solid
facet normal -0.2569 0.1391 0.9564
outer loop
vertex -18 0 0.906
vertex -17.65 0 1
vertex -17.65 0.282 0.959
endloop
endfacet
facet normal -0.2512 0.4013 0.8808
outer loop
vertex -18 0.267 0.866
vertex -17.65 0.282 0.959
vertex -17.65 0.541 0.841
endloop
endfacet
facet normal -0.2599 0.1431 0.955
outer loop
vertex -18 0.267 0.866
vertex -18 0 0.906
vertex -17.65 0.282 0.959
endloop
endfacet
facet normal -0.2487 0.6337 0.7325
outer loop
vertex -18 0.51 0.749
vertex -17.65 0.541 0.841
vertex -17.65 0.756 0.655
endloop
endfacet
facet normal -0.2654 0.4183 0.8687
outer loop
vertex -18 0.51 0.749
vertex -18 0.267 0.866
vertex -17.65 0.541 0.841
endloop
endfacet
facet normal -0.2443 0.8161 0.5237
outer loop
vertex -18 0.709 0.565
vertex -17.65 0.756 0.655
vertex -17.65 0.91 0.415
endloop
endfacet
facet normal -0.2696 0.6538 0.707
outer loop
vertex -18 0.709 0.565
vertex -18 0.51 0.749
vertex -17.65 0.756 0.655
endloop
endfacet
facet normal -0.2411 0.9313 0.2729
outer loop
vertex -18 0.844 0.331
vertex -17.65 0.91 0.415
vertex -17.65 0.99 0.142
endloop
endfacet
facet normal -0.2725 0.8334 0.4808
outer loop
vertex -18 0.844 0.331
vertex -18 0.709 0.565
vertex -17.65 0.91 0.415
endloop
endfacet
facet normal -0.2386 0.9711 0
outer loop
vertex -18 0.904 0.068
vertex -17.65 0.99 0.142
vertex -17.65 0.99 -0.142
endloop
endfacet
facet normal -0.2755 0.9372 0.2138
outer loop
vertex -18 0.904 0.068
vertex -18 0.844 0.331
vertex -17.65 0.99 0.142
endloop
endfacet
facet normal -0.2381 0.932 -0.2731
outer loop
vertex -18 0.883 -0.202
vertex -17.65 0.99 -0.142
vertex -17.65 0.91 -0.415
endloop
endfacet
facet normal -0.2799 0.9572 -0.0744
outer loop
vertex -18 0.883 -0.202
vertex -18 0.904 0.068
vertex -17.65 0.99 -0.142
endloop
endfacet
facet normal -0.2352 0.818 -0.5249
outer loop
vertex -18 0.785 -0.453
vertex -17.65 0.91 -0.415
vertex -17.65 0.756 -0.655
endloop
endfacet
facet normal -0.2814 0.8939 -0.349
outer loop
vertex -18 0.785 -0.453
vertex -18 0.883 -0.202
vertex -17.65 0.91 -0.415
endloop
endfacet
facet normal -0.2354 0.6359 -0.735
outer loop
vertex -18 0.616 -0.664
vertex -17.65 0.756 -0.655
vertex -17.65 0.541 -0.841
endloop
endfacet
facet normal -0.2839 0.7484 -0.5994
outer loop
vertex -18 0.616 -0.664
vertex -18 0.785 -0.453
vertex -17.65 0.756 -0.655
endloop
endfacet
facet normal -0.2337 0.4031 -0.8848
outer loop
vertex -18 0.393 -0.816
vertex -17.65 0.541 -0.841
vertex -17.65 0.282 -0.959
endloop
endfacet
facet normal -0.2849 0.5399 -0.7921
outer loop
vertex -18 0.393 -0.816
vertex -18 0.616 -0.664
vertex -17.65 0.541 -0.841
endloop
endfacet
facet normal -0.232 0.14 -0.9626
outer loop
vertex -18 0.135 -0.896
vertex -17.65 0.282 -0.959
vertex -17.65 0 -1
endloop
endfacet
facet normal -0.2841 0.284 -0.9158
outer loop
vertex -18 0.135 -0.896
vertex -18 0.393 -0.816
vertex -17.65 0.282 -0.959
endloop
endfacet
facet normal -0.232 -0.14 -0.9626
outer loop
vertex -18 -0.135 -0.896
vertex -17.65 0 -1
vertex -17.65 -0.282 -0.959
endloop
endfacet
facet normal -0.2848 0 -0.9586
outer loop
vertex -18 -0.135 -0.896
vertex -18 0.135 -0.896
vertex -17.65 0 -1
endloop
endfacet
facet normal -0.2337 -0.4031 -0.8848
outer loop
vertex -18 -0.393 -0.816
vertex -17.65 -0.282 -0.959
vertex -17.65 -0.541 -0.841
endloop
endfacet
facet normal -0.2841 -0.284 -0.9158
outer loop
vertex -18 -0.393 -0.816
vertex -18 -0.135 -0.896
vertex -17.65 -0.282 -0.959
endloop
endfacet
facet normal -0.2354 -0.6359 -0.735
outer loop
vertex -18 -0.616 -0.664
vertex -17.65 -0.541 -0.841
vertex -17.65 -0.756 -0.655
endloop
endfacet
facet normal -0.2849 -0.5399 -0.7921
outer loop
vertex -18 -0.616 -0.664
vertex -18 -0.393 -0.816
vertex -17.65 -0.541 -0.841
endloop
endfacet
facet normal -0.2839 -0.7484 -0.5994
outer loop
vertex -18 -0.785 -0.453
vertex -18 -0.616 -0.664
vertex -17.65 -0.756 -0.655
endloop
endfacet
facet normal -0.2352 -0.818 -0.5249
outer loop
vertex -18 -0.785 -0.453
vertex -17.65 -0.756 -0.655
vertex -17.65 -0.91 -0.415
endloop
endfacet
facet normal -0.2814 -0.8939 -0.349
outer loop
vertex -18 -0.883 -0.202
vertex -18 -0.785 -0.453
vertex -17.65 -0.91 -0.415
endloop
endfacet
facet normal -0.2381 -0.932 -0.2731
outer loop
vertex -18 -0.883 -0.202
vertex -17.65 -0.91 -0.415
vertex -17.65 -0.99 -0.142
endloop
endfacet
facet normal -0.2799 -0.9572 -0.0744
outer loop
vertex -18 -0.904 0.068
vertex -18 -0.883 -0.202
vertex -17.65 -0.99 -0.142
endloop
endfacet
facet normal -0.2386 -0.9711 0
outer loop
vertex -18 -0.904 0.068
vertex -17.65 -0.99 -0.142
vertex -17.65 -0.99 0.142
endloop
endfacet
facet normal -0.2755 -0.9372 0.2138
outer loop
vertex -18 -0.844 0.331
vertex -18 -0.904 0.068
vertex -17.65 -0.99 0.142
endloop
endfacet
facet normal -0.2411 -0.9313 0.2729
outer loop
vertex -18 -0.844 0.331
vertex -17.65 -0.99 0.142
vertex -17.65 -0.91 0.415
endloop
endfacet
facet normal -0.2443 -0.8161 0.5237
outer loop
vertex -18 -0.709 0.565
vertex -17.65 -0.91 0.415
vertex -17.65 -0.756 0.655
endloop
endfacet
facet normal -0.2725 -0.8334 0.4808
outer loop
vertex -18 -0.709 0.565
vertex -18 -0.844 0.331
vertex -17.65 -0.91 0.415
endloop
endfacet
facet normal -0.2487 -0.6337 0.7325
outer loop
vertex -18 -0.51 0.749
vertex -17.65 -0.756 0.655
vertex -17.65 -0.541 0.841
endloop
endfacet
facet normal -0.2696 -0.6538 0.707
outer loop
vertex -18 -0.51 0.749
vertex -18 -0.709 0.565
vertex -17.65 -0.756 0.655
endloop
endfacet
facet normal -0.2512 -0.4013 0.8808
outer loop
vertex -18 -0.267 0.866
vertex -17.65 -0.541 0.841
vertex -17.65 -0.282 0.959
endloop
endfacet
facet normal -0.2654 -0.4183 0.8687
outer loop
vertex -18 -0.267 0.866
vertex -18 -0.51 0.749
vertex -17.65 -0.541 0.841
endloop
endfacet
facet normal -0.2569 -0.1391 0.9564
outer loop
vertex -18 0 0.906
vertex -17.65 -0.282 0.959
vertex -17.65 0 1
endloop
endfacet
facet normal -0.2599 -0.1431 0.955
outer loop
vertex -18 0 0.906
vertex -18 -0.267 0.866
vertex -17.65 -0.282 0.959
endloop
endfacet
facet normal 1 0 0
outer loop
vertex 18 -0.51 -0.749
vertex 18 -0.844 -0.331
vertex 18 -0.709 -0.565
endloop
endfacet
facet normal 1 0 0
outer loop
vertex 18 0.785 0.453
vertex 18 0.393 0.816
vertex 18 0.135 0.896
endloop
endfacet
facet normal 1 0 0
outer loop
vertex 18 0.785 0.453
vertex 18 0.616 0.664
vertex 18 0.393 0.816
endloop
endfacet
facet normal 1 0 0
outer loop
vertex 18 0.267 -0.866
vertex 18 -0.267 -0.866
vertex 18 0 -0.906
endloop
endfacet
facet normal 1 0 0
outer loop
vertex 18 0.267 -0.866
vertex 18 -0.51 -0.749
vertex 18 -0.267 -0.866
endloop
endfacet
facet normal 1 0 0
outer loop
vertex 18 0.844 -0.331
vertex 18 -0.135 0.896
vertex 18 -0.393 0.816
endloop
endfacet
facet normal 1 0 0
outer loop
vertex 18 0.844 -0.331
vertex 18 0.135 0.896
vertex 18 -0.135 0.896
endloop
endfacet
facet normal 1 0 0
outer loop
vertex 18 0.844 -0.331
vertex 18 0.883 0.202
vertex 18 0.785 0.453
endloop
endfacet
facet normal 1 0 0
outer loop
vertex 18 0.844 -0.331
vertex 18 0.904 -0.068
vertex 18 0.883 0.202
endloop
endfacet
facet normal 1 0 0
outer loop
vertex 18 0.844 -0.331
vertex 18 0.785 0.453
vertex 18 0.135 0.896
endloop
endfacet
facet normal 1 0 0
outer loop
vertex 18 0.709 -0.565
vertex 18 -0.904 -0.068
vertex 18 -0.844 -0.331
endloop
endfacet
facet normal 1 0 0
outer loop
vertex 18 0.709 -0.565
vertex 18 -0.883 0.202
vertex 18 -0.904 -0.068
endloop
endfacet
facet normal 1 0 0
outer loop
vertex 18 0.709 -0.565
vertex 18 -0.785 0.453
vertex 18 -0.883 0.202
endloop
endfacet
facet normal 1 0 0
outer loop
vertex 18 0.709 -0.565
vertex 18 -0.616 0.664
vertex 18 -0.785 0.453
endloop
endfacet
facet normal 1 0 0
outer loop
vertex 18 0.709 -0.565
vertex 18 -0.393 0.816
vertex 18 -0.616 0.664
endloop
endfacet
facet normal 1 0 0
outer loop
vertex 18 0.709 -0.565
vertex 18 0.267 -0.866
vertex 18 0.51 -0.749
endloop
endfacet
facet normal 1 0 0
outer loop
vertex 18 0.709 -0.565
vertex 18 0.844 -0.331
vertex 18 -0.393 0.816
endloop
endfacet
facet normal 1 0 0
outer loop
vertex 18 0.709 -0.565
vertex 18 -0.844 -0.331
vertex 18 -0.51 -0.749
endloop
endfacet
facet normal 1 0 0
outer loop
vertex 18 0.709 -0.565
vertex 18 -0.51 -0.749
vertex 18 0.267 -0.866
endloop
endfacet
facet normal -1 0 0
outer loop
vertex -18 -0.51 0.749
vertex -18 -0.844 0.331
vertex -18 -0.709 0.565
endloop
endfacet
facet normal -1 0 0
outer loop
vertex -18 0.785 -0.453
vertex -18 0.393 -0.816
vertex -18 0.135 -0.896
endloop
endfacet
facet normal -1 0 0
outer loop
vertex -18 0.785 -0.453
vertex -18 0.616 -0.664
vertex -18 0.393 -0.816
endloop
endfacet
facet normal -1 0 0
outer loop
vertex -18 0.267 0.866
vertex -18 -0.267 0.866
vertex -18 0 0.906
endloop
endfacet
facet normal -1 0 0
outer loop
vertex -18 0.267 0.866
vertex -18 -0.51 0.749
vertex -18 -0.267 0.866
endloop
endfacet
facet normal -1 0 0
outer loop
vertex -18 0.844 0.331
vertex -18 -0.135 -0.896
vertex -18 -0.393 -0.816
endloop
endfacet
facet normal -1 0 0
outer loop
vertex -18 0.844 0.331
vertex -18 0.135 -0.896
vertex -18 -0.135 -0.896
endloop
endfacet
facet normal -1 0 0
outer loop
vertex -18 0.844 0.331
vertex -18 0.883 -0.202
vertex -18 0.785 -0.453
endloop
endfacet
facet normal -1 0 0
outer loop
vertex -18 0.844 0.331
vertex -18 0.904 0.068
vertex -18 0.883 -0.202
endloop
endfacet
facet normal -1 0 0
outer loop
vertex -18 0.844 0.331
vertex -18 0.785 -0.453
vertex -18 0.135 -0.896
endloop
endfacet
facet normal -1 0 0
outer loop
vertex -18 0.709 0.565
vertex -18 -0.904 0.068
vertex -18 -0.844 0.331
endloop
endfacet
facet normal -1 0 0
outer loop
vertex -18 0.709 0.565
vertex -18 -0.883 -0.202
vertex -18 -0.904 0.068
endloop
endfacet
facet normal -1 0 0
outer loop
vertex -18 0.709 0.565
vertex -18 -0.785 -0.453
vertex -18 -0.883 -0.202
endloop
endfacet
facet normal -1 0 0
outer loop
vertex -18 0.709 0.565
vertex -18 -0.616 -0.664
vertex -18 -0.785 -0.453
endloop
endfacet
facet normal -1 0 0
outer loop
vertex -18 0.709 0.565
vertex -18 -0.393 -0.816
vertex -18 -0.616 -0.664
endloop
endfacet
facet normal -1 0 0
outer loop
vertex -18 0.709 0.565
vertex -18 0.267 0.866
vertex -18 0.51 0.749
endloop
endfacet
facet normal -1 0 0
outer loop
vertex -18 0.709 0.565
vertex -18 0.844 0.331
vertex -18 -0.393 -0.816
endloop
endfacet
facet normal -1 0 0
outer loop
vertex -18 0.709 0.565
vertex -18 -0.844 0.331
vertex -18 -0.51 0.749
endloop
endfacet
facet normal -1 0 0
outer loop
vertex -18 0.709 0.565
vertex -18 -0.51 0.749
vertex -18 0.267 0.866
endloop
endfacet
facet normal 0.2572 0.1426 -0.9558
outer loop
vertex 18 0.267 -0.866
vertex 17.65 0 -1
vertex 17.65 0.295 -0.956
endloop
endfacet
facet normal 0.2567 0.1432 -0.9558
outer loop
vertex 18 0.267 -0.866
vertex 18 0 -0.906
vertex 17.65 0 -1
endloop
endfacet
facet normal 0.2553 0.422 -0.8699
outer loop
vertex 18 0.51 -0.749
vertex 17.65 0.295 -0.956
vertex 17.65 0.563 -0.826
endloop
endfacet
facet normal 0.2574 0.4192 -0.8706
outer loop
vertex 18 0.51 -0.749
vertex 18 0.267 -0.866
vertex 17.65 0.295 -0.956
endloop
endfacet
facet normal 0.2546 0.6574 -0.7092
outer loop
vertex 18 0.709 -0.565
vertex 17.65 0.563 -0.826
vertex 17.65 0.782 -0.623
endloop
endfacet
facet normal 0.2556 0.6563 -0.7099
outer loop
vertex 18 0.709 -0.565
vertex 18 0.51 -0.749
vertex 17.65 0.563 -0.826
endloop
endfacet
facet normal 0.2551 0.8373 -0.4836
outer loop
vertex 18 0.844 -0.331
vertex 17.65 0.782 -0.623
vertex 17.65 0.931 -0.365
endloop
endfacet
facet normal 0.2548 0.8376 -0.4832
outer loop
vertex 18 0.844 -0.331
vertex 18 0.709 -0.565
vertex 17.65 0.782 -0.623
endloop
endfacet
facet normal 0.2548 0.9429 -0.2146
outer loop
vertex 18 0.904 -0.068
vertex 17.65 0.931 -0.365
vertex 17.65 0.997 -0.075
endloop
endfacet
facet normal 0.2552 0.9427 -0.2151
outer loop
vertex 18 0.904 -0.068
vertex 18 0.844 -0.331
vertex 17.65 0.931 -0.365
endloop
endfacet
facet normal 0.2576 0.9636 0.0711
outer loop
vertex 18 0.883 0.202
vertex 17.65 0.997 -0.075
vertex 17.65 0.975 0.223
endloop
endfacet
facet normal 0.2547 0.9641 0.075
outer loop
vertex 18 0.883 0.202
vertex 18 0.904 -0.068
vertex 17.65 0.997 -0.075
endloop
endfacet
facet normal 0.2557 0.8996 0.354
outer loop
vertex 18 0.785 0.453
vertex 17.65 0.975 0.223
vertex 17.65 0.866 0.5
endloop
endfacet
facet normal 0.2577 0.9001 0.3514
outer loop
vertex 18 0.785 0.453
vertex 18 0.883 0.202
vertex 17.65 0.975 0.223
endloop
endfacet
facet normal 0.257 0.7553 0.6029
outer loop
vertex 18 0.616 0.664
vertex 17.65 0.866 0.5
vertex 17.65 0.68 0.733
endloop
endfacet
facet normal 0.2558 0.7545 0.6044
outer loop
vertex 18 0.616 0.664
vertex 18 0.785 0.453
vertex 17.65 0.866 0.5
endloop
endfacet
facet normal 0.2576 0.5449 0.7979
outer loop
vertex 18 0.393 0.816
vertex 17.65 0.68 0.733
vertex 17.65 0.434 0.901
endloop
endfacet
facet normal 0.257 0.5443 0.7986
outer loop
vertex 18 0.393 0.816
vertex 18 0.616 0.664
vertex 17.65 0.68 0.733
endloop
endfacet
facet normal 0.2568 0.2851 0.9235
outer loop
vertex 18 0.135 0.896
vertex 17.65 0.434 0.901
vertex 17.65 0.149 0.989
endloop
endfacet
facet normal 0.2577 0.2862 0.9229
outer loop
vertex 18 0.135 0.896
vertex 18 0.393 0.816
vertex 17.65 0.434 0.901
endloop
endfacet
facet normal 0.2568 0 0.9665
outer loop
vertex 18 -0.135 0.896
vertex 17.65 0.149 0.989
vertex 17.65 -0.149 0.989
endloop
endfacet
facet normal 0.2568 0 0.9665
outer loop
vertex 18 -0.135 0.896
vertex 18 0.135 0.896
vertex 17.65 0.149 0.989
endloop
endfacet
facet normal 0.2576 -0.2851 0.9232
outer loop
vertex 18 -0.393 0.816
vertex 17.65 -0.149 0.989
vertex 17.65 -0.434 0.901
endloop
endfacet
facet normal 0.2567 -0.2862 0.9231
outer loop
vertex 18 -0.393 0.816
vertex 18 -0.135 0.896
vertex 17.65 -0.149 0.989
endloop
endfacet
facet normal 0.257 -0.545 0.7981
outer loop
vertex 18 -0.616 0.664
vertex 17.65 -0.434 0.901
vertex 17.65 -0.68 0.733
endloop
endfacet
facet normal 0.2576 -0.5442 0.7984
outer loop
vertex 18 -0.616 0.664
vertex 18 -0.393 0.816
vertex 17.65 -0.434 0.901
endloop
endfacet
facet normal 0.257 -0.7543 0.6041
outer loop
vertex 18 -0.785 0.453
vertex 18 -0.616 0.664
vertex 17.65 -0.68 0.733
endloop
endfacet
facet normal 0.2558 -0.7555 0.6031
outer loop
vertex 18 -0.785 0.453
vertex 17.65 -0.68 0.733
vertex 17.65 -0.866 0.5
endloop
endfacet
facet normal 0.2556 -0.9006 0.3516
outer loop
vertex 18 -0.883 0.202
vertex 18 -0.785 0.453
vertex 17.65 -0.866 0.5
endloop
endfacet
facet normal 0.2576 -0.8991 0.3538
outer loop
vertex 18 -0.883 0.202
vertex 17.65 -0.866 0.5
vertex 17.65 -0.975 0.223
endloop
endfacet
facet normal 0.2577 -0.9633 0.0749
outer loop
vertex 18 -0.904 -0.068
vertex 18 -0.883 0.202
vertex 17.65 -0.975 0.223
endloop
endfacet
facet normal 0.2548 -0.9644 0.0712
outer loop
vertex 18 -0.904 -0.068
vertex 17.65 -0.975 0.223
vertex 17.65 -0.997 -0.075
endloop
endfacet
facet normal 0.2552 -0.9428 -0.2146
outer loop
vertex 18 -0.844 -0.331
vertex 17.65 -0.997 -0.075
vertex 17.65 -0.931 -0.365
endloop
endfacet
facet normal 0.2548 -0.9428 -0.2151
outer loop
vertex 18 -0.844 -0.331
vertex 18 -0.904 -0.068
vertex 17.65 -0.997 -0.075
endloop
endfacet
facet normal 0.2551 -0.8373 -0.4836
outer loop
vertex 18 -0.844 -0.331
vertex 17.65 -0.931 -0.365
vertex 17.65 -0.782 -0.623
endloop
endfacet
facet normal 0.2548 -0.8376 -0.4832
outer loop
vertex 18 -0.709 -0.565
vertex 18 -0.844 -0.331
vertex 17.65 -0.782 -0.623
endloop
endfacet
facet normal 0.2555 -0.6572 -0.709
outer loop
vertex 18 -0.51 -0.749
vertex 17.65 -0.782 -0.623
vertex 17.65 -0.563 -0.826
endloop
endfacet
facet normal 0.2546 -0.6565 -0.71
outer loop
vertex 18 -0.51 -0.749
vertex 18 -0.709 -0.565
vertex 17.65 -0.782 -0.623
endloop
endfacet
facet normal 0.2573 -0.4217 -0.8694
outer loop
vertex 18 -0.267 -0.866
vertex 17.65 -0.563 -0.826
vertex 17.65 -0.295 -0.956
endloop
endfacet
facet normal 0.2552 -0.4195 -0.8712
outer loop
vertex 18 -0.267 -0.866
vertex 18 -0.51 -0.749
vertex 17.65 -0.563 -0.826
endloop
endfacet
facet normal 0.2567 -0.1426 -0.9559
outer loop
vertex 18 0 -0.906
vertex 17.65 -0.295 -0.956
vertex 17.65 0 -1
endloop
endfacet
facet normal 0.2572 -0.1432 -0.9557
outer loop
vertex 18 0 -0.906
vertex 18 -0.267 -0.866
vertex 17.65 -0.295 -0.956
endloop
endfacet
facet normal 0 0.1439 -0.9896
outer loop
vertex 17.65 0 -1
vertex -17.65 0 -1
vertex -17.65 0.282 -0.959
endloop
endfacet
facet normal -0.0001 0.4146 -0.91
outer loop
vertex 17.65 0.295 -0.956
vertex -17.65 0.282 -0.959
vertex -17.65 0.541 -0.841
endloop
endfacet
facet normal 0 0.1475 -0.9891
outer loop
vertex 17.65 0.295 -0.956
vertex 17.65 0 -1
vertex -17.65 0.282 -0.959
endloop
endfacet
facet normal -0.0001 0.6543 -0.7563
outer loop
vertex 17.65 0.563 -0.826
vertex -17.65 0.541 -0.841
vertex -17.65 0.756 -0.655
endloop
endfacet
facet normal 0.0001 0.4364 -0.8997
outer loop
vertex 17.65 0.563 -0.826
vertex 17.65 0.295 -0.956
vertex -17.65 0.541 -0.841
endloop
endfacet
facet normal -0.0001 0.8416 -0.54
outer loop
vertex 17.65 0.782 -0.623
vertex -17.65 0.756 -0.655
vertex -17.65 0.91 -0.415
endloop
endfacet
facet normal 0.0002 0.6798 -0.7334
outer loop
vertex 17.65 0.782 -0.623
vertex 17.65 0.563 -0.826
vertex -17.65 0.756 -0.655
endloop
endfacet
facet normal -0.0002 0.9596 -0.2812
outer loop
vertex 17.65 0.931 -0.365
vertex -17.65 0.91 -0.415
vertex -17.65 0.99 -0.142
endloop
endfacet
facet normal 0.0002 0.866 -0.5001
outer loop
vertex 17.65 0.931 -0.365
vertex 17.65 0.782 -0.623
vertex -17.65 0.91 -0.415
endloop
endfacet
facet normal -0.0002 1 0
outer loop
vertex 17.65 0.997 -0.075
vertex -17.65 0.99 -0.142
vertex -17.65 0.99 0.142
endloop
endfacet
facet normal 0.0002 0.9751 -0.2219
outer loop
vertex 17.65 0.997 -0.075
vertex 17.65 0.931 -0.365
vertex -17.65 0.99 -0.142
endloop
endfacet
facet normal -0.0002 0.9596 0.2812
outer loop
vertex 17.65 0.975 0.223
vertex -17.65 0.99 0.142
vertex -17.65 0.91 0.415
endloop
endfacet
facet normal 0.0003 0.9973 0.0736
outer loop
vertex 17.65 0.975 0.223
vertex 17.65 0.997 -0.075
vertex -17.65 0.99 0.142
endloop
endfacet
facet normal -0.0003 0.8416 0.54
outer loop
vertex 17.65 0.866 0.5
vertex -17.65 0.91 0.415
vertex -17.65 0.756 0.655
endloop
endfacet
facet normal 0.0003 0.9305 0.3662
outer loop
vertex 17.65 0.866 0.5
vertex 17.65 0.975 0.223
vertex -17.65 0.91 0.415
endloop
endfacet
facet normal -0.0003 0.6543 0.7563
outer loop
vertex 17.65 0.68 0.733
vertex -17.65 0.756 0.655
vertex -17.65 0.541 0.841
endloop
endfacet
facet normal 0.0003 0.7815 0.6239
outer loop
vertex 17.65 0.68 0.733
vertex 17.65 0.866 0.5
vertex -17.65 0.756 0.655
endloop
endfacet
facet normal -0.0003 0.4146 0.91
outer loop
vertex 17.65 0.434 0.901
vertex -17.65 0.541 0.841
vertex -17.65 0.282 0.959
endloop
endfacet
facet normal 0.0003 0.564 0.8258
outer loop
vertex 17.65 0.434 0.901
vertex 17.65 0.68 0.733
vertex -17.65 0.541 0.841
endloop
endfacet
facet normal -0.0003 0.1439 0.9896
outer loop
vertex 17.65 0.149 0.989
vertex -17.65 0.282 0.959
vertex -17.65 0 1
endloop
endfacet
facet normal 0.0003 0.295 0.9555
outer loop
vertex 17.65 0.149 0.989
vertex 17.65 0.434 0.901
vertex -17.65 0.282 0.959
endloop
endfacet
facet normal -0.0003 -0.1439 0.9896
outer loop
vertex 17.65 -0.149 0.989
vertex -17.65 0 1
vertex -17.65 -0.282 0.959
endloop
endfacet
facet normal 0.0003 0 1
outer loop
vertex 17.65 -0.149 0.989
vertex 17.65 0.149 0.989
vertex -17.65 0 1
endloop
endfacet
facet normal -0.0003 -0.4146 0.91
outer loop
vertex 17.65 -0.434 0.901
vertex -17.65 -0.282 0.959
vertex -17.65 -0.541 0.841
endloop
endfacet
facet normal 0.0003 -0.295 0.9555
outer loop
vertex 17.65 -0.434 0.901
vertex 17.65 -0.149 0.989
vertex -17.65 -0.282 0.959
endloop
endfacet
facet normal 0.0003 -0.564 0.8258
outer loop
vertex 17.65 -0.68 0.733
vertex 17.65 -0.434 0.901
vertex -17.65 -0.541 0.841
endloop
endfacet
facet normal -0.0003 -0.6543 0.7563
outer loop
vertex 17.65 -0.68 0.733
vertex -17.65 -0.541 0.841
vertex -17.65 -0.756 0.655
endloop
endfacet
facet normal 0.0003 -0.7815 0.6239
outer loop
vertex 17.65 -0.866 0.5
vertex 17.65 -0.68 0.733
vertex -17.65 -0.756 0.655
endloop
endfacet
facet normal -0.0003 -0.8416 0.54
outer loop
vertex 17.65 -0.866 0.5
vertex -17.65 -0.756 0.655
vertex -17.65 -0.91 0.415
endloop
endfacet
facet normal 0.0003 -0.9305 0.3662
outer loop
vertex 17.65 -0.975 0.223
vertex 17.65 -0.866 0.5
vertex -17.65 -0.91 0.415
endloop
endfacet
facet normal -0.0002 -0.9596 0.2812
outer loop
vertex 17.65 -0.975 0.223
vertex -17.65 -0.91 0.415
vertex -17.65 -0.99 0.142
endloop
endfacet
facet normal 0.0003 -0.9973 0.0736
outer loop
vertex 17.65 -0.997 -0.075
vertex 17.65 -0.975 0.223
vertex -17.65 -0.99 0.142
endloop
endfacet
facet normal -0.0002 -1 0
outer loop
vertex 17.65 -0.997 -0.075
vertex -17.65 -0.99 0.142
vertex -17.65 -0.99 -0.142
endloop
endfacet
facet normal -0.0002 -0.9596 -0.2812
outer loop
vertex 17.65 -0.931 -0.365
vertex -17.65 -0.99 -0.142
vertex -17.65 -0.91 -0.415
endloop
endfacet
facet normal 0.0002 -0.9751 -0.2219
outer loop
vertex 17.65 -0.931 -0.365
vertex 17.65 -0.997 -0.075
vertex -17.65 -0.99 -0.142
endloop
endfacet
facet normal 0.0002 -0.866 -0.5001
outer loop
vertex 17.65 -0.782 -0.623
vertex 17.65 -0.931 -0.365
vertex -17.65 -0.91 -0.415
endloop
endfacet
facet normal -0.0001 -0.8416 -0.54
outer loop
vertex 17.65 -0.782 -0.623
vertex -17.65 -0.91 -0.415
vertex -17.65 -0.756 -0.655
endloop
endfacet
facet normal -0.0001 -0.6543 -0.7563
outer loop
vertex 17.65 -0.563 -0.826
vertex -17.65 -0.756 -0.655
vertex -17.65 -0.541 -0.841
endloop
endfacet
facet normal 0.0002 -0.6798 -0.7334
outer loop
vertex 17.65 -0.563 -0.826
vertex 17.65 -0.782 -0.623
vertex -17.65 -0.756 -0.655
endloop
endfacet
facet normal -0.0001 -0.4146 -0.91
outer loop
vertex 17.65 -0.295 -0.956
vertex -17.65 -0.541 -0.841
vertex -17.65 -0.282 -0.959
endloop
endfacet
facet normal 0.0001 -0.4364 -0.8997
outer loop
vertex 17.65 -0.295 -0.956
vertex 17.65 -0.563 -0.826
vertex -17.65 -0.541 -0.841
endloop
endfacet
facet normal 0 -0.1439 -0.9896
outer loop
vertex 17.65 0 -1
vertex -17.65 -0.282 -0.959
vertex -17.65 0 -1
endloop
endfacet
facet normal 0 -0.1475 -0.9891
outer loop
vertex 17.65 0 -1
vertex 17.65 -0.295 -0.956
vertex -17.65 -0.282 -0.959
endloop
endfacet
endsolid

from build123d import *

# Parameters (mm, degrees)
SKETCH2_R           = 1
EXTRUDE1_DEPTH      = 17.65
EXTRUDE1_DEPTH_BACK = 17.65
SKETCH3_R           = 1
EXTRUDE2_DEPTH      = 0.35
EXTRUDE2_TAPER      = 15
SKETCH4_R           = 1
EXTRUDE3_DEPTH      = 0.35
EXTRUDE3_TAPER      = 15


with BuildPart() as part:
    # Sketch2 → Extrude1 (new body, two sides)
    with BuildSketch(Plane(origin=(0, 0, 0), x_dir=(0, 0, -1), z_dir=(1, 0, 0))) as extrude1_sk:
        Circle(SKETCH2_R)
    extrude(amount=EXTRUDE1_DEPTH)
    extrude(extrude1_sk.sketch, amount=-EXTRUDE1_DEPTH_BACK)

    # Sketch3 → Extrude2 (add)
    with BuildSketch(Plane(origin=(17.65, 0, 0), x_dir=(0, 0, -1), z_dir=(1, 0, 0))):
        Circle(SKETCH3_R)
    extrude(amount=EXTRUDE2_DEPTH, taper=EXTRUDE2_TAPER)

    # Sketch4 → Extrude3 (add)
    with BuildSketch(Plane.ZY.offset(17.65)):
        Circle(SKETCH4_R)
    extrude(amount=EXTRUDE3_DEPTH, taper=EXTRUDE3_TAPER)


solid = part.part
